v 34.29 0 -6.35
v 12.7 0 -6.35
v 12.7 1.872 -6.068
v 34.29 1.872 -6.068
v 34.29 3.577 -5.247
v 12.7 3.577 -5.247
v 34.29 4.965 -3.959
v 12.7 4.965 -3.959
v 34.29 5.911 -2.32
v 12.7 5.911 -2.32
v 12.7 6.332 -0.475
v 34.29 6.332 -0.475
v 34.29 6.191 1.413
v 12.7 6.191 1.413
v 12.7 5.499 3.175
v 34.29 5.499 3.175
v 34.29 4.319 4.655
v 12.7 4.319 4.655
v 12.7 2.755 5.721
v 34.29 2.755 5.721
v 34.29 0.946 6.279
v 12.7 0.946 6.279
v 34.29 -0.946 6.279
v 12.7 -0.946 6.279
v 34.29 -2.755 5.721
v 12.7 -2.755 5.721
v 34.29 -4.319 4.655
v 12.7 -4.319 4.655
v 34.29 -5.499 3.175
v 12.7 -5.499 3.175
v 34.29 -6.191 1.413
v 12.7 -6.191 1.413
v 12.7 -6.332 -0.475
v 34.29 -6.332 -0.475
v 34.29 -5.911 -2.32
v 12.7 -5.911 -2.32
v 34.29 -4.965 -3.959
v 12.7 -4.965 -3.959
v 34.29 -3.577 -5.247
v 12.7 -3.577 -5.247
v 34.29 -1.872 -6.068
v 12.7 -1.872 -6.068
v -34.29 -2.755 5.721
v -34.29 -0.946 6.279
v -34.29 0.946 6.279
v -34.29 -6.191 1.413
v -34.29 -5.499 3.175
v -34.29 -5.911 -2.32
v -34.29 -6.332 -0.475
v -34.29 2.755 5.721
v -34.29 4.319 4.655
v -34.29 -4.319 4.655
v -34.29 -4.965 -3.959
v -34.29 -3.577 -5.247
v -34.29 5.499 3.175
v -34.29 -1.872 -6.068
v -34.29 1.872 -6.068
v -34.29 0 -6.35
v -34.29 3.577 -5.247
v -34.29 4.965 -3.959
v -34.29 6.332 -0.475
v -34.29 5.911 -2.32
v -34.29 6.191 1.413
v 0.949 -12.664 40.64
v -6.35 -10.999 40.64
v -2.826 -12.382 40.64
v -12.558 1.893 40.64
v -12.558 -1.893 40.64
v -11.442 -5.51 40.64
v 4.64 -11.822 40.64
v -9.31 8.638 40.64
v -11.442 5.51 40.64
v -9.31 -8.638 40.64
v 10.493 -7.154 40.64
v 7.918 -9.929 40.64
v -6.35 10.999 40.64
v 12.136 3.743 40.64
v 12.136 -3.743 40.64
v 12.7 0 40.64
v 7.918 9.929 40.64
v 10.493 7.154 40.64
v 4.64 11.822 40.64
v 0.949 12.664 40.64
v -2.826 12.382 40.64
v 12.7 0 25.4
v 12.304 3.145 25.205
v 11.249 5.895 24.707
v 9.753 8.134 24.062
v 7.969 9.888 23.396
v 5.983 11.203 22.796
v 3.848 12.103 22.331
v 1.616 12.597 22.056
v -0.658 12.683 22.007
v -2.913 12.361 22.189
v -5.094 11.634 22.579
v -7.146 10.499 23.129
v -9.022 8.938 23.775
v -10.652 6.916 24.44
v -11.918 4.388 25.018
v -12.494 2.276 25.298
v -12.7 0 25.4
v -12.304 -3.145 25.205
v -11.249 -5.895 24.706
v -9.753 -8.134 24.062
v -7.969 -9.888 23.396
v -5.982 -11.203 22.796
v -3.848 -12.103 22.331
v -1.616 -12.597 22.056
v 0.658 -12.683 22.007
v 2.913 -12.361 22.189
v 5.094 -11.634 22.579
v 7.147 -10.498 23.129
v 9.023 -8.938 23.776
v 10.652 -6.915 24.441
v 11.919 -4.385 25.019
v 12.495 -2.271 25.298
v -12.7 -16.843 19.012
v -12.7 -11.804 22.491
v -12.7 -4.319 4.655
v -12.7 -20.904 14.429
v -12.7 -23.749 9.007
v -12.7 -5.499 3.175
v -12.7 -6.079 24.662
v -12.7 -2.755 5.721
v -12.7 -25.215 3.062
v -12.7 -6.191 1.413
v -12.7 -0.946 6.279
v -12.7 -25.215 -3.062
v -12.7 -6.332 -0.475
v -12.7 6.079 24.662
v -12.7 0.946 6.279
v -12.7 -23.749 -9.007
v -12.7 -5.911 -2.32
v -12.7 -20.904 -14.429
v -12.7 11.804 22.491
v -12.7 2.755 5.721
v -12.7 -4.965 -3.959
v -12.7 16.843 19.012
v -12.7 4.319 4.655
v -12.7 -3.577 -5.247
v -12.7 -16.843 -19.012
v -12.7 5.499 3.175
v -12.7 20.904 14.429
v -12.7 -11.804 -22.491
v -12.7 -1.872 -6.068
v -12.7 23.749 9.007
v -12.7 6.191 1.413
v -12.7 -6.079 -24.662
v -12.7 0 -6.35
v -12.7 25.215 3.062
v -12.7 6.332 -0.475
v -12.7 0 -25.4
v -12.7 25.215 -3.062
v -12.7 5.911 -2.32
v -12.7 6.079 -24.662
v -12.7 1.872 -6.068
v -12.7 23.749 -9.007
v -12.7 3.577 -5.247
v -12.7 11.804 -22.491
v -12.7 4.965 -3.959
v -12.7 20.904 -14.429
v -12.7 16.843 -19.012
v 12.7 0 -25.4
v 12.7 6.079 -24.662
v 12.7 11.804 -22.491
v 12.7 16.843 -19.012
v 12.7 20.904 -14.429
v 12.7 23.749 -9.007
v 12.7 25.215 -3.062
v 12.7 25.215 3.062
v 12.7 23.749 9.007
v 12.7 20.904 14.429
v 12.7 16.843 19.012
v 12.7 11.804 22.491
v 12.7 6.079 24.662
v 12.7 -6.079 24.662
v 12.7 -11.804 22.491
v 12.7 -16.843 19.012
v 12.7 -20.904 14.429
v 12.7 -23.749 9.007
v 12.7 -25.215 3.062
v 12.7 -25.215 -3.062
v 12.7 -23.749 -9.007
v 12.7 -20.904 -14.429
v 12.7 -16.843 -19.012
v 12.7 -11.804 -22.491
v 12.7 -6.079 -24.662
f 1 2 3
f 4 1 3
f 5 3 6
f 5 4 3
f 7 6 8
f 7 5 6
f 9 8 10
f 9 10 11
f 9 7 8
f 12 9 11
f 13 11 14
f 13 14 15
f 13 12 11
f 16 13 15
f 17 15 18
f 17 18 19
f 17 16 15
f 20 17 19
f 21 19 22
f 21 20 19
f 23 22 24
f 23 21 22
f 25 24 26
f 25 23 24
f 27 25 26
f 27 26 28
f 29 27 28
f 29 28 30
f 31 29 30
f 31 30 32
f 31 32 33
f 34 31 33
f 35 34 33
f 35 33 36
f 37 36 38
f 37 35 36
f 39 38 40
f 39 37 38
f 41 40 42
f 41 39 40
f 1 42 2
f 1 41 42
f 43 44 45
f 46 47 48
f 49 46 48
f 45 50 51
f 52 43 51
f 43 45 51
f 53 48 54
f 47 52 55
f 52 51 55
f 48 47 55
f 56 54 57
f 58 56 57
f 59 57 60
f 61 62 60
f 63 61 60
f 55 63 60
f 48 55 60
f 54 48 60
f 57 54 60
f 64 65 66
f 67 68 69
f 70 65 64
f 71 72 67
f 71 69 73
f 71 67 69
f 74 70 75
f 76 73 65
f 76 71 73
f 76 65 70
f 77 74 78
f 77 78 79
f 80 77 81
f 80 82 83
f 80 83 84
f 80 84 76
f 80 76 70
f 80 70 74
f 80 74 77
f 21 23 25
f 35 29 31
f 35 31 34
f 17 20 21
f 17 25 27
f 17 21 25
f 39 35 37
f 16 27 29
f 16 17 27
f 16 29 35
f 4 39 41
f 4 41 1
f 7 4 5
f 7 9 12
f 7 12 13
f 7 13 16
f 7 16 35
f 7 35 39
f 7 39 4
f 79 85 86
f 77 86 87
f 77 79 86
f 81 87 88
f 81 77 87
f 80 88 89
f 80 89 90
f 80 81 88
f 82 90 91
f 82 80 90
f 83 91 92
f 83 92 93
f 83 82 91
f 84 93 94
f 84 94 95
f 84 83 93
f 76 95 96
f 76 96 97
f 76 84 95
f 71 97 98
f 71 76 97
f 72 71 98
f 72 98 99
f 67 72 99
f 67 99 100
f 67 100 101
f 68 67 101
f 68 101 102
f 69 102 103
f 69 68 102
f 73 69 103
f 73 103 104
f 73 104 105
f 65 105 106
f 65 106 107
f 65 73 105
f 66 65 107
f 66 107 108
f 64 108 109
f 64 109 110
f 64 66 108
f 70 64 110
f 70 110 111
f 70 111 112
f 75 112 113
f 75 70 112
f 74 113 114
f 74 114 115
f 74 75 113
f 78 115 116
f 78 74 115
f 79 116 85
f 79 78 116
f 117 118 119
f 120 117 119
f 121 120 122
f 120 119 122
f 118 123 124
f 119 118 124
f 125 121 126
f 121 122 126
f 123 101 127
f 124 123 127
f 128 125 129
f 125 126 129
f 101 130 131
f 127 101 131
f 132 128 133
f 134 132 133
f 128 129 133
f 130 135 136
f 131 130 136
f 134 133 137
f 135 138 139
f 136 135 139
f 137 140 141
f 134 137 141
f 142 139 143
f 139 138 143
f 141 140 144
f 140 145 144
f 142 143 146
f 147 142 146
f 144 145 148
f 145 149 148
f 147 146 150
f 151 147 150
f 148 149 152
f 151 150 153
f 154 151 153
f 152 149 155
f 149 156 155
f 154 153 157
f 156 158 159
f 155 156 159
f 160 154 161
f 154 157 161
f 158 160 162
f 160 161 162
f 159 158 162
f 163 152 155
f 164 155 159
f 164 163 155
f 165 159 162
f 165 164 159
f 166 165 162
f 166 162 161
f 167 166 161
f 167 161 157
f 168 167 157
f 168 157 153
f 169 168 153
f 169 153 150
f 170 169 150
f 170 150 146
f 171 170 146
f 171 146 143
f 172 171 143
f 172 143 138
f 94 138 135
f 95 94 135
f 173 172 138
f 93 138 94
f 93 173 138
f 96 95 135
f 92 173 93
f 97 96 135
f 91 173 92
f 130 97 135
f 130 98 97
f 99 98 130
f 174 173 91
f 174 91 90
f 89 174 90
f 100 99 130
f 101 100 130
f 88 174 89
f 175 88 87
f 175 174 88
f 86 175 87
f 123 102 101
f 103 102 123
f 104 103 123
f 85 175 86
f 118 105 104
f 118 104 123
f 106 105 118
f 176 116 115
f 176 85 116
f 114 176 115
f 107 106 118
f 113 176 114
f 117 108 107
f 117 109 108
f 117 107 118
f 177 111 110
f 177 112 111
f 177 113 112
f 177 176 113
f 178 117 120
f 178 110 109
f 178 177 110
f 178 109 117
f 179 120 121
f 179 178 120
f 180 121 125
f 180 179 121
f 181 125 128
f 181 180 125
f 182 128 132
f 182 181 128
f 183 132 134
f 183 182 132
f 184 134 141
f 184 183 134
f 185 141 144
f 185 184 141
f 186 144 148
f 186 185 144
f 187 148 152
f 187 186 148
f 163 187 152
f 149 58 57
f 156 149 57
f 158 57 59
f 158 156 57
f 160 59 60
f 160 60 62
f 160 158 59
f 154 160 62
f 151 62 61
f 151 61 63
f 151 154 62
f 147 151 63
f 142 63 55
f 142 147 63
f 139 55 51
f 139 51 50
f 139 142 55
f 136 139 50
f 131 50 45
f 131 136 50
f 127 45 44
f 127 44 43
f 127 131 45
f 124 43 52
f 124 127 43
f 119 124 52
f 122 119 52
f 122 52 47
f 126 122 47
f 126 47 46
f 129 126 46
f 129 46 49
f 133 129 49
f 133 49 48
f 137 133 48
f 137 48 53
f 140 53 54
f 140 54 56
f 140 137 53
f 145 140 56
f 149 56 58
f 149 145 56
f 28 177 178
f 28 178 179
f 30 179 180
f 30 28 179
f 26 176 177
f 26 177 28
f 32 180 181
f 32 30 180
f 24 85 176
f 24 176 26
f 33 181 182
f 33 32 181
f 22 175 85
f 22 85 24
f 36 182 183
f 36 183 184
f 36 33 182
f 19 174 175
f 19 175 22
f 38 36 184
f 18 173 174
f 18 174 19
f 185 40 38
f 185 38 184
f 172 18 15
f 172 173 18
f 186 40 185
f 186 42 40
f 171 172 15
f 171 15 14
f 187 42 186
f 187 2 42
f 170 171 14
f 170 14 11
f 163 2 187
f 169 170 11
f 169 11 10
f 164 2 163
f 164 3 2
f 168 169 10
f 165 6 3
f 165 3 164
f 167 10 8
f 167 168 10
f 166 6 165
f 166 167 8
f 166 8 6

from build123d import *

# Parameters (mm, degrees)
CROQUIS1_R                   = 25.4
SALIENTE_EXTRUIR1_DEPTH      = 12.7
SALIENTE_EXTRUIR2_REACH      = 73.887
SALIENTE_EXTRUIR2_END_RADIUS = 25.4
CROQUIS2_R                   = 12.7
CROQUIS6_R                   = 6.35
SALIENTE_EXTRUIR5_DEPTH      = 34.29


with BuildPart() as part:
    # Croquis1 → Saliente-Extruir1 (new, symmetric)
    with BuildSketch(Plane(origin=(0, 0, 0), x_dir=(0, 0, -1), z_dir=(1, 0, 0))):
        Circle(CROQUIS1_R)
    extrude(amount=SALIENTE_EXTRUIR1_DEPTH, both=True)

    # Saliente-Extruir2: up to this cylinder (the profile starts outside it)
    saliente_extruir2_end = Plane(origin=(0, 0, 0), z_dir=(-1, 0, 0)) * Cylinder(SALIENTE_EXTRUIR2_END_RADIUS, 199.574, mode=Mode.PRIVATE)
    # Croquis2 → Saliente-Extruir2 (add, up to the surface)
    with BuildSketch(Plane.XY.offset(40.64), mode=Mode.PRIVATE) as saliente_extruir2_sk1:
        Circle(CROQUIS2_R)
    saliente_extruir2_tool1 = extrude(saliente_extruir2_sk1.sketch, amount=-SALIENTE_EXTRUIR2_REACH, mode=Mode.PRIVATE) - saliente_extruir2_end
    add(saliente_extruir2_tool1.solids().sort_by_distance((0, 0, 40.64))[0])

    # Croquis6 → Saliente-Extruir5 (add, symmetric)
    with BuildSketch(Plane(origin=(0, 0, 0), x_dir=(0, 0, -1), z_dir=(1, 0, 0))):
        Circle(CROQUIS6_R)
    extrude(amount=SALIENTE_EXTRUIR5_DEPTH, both=True)


solid = part.part
